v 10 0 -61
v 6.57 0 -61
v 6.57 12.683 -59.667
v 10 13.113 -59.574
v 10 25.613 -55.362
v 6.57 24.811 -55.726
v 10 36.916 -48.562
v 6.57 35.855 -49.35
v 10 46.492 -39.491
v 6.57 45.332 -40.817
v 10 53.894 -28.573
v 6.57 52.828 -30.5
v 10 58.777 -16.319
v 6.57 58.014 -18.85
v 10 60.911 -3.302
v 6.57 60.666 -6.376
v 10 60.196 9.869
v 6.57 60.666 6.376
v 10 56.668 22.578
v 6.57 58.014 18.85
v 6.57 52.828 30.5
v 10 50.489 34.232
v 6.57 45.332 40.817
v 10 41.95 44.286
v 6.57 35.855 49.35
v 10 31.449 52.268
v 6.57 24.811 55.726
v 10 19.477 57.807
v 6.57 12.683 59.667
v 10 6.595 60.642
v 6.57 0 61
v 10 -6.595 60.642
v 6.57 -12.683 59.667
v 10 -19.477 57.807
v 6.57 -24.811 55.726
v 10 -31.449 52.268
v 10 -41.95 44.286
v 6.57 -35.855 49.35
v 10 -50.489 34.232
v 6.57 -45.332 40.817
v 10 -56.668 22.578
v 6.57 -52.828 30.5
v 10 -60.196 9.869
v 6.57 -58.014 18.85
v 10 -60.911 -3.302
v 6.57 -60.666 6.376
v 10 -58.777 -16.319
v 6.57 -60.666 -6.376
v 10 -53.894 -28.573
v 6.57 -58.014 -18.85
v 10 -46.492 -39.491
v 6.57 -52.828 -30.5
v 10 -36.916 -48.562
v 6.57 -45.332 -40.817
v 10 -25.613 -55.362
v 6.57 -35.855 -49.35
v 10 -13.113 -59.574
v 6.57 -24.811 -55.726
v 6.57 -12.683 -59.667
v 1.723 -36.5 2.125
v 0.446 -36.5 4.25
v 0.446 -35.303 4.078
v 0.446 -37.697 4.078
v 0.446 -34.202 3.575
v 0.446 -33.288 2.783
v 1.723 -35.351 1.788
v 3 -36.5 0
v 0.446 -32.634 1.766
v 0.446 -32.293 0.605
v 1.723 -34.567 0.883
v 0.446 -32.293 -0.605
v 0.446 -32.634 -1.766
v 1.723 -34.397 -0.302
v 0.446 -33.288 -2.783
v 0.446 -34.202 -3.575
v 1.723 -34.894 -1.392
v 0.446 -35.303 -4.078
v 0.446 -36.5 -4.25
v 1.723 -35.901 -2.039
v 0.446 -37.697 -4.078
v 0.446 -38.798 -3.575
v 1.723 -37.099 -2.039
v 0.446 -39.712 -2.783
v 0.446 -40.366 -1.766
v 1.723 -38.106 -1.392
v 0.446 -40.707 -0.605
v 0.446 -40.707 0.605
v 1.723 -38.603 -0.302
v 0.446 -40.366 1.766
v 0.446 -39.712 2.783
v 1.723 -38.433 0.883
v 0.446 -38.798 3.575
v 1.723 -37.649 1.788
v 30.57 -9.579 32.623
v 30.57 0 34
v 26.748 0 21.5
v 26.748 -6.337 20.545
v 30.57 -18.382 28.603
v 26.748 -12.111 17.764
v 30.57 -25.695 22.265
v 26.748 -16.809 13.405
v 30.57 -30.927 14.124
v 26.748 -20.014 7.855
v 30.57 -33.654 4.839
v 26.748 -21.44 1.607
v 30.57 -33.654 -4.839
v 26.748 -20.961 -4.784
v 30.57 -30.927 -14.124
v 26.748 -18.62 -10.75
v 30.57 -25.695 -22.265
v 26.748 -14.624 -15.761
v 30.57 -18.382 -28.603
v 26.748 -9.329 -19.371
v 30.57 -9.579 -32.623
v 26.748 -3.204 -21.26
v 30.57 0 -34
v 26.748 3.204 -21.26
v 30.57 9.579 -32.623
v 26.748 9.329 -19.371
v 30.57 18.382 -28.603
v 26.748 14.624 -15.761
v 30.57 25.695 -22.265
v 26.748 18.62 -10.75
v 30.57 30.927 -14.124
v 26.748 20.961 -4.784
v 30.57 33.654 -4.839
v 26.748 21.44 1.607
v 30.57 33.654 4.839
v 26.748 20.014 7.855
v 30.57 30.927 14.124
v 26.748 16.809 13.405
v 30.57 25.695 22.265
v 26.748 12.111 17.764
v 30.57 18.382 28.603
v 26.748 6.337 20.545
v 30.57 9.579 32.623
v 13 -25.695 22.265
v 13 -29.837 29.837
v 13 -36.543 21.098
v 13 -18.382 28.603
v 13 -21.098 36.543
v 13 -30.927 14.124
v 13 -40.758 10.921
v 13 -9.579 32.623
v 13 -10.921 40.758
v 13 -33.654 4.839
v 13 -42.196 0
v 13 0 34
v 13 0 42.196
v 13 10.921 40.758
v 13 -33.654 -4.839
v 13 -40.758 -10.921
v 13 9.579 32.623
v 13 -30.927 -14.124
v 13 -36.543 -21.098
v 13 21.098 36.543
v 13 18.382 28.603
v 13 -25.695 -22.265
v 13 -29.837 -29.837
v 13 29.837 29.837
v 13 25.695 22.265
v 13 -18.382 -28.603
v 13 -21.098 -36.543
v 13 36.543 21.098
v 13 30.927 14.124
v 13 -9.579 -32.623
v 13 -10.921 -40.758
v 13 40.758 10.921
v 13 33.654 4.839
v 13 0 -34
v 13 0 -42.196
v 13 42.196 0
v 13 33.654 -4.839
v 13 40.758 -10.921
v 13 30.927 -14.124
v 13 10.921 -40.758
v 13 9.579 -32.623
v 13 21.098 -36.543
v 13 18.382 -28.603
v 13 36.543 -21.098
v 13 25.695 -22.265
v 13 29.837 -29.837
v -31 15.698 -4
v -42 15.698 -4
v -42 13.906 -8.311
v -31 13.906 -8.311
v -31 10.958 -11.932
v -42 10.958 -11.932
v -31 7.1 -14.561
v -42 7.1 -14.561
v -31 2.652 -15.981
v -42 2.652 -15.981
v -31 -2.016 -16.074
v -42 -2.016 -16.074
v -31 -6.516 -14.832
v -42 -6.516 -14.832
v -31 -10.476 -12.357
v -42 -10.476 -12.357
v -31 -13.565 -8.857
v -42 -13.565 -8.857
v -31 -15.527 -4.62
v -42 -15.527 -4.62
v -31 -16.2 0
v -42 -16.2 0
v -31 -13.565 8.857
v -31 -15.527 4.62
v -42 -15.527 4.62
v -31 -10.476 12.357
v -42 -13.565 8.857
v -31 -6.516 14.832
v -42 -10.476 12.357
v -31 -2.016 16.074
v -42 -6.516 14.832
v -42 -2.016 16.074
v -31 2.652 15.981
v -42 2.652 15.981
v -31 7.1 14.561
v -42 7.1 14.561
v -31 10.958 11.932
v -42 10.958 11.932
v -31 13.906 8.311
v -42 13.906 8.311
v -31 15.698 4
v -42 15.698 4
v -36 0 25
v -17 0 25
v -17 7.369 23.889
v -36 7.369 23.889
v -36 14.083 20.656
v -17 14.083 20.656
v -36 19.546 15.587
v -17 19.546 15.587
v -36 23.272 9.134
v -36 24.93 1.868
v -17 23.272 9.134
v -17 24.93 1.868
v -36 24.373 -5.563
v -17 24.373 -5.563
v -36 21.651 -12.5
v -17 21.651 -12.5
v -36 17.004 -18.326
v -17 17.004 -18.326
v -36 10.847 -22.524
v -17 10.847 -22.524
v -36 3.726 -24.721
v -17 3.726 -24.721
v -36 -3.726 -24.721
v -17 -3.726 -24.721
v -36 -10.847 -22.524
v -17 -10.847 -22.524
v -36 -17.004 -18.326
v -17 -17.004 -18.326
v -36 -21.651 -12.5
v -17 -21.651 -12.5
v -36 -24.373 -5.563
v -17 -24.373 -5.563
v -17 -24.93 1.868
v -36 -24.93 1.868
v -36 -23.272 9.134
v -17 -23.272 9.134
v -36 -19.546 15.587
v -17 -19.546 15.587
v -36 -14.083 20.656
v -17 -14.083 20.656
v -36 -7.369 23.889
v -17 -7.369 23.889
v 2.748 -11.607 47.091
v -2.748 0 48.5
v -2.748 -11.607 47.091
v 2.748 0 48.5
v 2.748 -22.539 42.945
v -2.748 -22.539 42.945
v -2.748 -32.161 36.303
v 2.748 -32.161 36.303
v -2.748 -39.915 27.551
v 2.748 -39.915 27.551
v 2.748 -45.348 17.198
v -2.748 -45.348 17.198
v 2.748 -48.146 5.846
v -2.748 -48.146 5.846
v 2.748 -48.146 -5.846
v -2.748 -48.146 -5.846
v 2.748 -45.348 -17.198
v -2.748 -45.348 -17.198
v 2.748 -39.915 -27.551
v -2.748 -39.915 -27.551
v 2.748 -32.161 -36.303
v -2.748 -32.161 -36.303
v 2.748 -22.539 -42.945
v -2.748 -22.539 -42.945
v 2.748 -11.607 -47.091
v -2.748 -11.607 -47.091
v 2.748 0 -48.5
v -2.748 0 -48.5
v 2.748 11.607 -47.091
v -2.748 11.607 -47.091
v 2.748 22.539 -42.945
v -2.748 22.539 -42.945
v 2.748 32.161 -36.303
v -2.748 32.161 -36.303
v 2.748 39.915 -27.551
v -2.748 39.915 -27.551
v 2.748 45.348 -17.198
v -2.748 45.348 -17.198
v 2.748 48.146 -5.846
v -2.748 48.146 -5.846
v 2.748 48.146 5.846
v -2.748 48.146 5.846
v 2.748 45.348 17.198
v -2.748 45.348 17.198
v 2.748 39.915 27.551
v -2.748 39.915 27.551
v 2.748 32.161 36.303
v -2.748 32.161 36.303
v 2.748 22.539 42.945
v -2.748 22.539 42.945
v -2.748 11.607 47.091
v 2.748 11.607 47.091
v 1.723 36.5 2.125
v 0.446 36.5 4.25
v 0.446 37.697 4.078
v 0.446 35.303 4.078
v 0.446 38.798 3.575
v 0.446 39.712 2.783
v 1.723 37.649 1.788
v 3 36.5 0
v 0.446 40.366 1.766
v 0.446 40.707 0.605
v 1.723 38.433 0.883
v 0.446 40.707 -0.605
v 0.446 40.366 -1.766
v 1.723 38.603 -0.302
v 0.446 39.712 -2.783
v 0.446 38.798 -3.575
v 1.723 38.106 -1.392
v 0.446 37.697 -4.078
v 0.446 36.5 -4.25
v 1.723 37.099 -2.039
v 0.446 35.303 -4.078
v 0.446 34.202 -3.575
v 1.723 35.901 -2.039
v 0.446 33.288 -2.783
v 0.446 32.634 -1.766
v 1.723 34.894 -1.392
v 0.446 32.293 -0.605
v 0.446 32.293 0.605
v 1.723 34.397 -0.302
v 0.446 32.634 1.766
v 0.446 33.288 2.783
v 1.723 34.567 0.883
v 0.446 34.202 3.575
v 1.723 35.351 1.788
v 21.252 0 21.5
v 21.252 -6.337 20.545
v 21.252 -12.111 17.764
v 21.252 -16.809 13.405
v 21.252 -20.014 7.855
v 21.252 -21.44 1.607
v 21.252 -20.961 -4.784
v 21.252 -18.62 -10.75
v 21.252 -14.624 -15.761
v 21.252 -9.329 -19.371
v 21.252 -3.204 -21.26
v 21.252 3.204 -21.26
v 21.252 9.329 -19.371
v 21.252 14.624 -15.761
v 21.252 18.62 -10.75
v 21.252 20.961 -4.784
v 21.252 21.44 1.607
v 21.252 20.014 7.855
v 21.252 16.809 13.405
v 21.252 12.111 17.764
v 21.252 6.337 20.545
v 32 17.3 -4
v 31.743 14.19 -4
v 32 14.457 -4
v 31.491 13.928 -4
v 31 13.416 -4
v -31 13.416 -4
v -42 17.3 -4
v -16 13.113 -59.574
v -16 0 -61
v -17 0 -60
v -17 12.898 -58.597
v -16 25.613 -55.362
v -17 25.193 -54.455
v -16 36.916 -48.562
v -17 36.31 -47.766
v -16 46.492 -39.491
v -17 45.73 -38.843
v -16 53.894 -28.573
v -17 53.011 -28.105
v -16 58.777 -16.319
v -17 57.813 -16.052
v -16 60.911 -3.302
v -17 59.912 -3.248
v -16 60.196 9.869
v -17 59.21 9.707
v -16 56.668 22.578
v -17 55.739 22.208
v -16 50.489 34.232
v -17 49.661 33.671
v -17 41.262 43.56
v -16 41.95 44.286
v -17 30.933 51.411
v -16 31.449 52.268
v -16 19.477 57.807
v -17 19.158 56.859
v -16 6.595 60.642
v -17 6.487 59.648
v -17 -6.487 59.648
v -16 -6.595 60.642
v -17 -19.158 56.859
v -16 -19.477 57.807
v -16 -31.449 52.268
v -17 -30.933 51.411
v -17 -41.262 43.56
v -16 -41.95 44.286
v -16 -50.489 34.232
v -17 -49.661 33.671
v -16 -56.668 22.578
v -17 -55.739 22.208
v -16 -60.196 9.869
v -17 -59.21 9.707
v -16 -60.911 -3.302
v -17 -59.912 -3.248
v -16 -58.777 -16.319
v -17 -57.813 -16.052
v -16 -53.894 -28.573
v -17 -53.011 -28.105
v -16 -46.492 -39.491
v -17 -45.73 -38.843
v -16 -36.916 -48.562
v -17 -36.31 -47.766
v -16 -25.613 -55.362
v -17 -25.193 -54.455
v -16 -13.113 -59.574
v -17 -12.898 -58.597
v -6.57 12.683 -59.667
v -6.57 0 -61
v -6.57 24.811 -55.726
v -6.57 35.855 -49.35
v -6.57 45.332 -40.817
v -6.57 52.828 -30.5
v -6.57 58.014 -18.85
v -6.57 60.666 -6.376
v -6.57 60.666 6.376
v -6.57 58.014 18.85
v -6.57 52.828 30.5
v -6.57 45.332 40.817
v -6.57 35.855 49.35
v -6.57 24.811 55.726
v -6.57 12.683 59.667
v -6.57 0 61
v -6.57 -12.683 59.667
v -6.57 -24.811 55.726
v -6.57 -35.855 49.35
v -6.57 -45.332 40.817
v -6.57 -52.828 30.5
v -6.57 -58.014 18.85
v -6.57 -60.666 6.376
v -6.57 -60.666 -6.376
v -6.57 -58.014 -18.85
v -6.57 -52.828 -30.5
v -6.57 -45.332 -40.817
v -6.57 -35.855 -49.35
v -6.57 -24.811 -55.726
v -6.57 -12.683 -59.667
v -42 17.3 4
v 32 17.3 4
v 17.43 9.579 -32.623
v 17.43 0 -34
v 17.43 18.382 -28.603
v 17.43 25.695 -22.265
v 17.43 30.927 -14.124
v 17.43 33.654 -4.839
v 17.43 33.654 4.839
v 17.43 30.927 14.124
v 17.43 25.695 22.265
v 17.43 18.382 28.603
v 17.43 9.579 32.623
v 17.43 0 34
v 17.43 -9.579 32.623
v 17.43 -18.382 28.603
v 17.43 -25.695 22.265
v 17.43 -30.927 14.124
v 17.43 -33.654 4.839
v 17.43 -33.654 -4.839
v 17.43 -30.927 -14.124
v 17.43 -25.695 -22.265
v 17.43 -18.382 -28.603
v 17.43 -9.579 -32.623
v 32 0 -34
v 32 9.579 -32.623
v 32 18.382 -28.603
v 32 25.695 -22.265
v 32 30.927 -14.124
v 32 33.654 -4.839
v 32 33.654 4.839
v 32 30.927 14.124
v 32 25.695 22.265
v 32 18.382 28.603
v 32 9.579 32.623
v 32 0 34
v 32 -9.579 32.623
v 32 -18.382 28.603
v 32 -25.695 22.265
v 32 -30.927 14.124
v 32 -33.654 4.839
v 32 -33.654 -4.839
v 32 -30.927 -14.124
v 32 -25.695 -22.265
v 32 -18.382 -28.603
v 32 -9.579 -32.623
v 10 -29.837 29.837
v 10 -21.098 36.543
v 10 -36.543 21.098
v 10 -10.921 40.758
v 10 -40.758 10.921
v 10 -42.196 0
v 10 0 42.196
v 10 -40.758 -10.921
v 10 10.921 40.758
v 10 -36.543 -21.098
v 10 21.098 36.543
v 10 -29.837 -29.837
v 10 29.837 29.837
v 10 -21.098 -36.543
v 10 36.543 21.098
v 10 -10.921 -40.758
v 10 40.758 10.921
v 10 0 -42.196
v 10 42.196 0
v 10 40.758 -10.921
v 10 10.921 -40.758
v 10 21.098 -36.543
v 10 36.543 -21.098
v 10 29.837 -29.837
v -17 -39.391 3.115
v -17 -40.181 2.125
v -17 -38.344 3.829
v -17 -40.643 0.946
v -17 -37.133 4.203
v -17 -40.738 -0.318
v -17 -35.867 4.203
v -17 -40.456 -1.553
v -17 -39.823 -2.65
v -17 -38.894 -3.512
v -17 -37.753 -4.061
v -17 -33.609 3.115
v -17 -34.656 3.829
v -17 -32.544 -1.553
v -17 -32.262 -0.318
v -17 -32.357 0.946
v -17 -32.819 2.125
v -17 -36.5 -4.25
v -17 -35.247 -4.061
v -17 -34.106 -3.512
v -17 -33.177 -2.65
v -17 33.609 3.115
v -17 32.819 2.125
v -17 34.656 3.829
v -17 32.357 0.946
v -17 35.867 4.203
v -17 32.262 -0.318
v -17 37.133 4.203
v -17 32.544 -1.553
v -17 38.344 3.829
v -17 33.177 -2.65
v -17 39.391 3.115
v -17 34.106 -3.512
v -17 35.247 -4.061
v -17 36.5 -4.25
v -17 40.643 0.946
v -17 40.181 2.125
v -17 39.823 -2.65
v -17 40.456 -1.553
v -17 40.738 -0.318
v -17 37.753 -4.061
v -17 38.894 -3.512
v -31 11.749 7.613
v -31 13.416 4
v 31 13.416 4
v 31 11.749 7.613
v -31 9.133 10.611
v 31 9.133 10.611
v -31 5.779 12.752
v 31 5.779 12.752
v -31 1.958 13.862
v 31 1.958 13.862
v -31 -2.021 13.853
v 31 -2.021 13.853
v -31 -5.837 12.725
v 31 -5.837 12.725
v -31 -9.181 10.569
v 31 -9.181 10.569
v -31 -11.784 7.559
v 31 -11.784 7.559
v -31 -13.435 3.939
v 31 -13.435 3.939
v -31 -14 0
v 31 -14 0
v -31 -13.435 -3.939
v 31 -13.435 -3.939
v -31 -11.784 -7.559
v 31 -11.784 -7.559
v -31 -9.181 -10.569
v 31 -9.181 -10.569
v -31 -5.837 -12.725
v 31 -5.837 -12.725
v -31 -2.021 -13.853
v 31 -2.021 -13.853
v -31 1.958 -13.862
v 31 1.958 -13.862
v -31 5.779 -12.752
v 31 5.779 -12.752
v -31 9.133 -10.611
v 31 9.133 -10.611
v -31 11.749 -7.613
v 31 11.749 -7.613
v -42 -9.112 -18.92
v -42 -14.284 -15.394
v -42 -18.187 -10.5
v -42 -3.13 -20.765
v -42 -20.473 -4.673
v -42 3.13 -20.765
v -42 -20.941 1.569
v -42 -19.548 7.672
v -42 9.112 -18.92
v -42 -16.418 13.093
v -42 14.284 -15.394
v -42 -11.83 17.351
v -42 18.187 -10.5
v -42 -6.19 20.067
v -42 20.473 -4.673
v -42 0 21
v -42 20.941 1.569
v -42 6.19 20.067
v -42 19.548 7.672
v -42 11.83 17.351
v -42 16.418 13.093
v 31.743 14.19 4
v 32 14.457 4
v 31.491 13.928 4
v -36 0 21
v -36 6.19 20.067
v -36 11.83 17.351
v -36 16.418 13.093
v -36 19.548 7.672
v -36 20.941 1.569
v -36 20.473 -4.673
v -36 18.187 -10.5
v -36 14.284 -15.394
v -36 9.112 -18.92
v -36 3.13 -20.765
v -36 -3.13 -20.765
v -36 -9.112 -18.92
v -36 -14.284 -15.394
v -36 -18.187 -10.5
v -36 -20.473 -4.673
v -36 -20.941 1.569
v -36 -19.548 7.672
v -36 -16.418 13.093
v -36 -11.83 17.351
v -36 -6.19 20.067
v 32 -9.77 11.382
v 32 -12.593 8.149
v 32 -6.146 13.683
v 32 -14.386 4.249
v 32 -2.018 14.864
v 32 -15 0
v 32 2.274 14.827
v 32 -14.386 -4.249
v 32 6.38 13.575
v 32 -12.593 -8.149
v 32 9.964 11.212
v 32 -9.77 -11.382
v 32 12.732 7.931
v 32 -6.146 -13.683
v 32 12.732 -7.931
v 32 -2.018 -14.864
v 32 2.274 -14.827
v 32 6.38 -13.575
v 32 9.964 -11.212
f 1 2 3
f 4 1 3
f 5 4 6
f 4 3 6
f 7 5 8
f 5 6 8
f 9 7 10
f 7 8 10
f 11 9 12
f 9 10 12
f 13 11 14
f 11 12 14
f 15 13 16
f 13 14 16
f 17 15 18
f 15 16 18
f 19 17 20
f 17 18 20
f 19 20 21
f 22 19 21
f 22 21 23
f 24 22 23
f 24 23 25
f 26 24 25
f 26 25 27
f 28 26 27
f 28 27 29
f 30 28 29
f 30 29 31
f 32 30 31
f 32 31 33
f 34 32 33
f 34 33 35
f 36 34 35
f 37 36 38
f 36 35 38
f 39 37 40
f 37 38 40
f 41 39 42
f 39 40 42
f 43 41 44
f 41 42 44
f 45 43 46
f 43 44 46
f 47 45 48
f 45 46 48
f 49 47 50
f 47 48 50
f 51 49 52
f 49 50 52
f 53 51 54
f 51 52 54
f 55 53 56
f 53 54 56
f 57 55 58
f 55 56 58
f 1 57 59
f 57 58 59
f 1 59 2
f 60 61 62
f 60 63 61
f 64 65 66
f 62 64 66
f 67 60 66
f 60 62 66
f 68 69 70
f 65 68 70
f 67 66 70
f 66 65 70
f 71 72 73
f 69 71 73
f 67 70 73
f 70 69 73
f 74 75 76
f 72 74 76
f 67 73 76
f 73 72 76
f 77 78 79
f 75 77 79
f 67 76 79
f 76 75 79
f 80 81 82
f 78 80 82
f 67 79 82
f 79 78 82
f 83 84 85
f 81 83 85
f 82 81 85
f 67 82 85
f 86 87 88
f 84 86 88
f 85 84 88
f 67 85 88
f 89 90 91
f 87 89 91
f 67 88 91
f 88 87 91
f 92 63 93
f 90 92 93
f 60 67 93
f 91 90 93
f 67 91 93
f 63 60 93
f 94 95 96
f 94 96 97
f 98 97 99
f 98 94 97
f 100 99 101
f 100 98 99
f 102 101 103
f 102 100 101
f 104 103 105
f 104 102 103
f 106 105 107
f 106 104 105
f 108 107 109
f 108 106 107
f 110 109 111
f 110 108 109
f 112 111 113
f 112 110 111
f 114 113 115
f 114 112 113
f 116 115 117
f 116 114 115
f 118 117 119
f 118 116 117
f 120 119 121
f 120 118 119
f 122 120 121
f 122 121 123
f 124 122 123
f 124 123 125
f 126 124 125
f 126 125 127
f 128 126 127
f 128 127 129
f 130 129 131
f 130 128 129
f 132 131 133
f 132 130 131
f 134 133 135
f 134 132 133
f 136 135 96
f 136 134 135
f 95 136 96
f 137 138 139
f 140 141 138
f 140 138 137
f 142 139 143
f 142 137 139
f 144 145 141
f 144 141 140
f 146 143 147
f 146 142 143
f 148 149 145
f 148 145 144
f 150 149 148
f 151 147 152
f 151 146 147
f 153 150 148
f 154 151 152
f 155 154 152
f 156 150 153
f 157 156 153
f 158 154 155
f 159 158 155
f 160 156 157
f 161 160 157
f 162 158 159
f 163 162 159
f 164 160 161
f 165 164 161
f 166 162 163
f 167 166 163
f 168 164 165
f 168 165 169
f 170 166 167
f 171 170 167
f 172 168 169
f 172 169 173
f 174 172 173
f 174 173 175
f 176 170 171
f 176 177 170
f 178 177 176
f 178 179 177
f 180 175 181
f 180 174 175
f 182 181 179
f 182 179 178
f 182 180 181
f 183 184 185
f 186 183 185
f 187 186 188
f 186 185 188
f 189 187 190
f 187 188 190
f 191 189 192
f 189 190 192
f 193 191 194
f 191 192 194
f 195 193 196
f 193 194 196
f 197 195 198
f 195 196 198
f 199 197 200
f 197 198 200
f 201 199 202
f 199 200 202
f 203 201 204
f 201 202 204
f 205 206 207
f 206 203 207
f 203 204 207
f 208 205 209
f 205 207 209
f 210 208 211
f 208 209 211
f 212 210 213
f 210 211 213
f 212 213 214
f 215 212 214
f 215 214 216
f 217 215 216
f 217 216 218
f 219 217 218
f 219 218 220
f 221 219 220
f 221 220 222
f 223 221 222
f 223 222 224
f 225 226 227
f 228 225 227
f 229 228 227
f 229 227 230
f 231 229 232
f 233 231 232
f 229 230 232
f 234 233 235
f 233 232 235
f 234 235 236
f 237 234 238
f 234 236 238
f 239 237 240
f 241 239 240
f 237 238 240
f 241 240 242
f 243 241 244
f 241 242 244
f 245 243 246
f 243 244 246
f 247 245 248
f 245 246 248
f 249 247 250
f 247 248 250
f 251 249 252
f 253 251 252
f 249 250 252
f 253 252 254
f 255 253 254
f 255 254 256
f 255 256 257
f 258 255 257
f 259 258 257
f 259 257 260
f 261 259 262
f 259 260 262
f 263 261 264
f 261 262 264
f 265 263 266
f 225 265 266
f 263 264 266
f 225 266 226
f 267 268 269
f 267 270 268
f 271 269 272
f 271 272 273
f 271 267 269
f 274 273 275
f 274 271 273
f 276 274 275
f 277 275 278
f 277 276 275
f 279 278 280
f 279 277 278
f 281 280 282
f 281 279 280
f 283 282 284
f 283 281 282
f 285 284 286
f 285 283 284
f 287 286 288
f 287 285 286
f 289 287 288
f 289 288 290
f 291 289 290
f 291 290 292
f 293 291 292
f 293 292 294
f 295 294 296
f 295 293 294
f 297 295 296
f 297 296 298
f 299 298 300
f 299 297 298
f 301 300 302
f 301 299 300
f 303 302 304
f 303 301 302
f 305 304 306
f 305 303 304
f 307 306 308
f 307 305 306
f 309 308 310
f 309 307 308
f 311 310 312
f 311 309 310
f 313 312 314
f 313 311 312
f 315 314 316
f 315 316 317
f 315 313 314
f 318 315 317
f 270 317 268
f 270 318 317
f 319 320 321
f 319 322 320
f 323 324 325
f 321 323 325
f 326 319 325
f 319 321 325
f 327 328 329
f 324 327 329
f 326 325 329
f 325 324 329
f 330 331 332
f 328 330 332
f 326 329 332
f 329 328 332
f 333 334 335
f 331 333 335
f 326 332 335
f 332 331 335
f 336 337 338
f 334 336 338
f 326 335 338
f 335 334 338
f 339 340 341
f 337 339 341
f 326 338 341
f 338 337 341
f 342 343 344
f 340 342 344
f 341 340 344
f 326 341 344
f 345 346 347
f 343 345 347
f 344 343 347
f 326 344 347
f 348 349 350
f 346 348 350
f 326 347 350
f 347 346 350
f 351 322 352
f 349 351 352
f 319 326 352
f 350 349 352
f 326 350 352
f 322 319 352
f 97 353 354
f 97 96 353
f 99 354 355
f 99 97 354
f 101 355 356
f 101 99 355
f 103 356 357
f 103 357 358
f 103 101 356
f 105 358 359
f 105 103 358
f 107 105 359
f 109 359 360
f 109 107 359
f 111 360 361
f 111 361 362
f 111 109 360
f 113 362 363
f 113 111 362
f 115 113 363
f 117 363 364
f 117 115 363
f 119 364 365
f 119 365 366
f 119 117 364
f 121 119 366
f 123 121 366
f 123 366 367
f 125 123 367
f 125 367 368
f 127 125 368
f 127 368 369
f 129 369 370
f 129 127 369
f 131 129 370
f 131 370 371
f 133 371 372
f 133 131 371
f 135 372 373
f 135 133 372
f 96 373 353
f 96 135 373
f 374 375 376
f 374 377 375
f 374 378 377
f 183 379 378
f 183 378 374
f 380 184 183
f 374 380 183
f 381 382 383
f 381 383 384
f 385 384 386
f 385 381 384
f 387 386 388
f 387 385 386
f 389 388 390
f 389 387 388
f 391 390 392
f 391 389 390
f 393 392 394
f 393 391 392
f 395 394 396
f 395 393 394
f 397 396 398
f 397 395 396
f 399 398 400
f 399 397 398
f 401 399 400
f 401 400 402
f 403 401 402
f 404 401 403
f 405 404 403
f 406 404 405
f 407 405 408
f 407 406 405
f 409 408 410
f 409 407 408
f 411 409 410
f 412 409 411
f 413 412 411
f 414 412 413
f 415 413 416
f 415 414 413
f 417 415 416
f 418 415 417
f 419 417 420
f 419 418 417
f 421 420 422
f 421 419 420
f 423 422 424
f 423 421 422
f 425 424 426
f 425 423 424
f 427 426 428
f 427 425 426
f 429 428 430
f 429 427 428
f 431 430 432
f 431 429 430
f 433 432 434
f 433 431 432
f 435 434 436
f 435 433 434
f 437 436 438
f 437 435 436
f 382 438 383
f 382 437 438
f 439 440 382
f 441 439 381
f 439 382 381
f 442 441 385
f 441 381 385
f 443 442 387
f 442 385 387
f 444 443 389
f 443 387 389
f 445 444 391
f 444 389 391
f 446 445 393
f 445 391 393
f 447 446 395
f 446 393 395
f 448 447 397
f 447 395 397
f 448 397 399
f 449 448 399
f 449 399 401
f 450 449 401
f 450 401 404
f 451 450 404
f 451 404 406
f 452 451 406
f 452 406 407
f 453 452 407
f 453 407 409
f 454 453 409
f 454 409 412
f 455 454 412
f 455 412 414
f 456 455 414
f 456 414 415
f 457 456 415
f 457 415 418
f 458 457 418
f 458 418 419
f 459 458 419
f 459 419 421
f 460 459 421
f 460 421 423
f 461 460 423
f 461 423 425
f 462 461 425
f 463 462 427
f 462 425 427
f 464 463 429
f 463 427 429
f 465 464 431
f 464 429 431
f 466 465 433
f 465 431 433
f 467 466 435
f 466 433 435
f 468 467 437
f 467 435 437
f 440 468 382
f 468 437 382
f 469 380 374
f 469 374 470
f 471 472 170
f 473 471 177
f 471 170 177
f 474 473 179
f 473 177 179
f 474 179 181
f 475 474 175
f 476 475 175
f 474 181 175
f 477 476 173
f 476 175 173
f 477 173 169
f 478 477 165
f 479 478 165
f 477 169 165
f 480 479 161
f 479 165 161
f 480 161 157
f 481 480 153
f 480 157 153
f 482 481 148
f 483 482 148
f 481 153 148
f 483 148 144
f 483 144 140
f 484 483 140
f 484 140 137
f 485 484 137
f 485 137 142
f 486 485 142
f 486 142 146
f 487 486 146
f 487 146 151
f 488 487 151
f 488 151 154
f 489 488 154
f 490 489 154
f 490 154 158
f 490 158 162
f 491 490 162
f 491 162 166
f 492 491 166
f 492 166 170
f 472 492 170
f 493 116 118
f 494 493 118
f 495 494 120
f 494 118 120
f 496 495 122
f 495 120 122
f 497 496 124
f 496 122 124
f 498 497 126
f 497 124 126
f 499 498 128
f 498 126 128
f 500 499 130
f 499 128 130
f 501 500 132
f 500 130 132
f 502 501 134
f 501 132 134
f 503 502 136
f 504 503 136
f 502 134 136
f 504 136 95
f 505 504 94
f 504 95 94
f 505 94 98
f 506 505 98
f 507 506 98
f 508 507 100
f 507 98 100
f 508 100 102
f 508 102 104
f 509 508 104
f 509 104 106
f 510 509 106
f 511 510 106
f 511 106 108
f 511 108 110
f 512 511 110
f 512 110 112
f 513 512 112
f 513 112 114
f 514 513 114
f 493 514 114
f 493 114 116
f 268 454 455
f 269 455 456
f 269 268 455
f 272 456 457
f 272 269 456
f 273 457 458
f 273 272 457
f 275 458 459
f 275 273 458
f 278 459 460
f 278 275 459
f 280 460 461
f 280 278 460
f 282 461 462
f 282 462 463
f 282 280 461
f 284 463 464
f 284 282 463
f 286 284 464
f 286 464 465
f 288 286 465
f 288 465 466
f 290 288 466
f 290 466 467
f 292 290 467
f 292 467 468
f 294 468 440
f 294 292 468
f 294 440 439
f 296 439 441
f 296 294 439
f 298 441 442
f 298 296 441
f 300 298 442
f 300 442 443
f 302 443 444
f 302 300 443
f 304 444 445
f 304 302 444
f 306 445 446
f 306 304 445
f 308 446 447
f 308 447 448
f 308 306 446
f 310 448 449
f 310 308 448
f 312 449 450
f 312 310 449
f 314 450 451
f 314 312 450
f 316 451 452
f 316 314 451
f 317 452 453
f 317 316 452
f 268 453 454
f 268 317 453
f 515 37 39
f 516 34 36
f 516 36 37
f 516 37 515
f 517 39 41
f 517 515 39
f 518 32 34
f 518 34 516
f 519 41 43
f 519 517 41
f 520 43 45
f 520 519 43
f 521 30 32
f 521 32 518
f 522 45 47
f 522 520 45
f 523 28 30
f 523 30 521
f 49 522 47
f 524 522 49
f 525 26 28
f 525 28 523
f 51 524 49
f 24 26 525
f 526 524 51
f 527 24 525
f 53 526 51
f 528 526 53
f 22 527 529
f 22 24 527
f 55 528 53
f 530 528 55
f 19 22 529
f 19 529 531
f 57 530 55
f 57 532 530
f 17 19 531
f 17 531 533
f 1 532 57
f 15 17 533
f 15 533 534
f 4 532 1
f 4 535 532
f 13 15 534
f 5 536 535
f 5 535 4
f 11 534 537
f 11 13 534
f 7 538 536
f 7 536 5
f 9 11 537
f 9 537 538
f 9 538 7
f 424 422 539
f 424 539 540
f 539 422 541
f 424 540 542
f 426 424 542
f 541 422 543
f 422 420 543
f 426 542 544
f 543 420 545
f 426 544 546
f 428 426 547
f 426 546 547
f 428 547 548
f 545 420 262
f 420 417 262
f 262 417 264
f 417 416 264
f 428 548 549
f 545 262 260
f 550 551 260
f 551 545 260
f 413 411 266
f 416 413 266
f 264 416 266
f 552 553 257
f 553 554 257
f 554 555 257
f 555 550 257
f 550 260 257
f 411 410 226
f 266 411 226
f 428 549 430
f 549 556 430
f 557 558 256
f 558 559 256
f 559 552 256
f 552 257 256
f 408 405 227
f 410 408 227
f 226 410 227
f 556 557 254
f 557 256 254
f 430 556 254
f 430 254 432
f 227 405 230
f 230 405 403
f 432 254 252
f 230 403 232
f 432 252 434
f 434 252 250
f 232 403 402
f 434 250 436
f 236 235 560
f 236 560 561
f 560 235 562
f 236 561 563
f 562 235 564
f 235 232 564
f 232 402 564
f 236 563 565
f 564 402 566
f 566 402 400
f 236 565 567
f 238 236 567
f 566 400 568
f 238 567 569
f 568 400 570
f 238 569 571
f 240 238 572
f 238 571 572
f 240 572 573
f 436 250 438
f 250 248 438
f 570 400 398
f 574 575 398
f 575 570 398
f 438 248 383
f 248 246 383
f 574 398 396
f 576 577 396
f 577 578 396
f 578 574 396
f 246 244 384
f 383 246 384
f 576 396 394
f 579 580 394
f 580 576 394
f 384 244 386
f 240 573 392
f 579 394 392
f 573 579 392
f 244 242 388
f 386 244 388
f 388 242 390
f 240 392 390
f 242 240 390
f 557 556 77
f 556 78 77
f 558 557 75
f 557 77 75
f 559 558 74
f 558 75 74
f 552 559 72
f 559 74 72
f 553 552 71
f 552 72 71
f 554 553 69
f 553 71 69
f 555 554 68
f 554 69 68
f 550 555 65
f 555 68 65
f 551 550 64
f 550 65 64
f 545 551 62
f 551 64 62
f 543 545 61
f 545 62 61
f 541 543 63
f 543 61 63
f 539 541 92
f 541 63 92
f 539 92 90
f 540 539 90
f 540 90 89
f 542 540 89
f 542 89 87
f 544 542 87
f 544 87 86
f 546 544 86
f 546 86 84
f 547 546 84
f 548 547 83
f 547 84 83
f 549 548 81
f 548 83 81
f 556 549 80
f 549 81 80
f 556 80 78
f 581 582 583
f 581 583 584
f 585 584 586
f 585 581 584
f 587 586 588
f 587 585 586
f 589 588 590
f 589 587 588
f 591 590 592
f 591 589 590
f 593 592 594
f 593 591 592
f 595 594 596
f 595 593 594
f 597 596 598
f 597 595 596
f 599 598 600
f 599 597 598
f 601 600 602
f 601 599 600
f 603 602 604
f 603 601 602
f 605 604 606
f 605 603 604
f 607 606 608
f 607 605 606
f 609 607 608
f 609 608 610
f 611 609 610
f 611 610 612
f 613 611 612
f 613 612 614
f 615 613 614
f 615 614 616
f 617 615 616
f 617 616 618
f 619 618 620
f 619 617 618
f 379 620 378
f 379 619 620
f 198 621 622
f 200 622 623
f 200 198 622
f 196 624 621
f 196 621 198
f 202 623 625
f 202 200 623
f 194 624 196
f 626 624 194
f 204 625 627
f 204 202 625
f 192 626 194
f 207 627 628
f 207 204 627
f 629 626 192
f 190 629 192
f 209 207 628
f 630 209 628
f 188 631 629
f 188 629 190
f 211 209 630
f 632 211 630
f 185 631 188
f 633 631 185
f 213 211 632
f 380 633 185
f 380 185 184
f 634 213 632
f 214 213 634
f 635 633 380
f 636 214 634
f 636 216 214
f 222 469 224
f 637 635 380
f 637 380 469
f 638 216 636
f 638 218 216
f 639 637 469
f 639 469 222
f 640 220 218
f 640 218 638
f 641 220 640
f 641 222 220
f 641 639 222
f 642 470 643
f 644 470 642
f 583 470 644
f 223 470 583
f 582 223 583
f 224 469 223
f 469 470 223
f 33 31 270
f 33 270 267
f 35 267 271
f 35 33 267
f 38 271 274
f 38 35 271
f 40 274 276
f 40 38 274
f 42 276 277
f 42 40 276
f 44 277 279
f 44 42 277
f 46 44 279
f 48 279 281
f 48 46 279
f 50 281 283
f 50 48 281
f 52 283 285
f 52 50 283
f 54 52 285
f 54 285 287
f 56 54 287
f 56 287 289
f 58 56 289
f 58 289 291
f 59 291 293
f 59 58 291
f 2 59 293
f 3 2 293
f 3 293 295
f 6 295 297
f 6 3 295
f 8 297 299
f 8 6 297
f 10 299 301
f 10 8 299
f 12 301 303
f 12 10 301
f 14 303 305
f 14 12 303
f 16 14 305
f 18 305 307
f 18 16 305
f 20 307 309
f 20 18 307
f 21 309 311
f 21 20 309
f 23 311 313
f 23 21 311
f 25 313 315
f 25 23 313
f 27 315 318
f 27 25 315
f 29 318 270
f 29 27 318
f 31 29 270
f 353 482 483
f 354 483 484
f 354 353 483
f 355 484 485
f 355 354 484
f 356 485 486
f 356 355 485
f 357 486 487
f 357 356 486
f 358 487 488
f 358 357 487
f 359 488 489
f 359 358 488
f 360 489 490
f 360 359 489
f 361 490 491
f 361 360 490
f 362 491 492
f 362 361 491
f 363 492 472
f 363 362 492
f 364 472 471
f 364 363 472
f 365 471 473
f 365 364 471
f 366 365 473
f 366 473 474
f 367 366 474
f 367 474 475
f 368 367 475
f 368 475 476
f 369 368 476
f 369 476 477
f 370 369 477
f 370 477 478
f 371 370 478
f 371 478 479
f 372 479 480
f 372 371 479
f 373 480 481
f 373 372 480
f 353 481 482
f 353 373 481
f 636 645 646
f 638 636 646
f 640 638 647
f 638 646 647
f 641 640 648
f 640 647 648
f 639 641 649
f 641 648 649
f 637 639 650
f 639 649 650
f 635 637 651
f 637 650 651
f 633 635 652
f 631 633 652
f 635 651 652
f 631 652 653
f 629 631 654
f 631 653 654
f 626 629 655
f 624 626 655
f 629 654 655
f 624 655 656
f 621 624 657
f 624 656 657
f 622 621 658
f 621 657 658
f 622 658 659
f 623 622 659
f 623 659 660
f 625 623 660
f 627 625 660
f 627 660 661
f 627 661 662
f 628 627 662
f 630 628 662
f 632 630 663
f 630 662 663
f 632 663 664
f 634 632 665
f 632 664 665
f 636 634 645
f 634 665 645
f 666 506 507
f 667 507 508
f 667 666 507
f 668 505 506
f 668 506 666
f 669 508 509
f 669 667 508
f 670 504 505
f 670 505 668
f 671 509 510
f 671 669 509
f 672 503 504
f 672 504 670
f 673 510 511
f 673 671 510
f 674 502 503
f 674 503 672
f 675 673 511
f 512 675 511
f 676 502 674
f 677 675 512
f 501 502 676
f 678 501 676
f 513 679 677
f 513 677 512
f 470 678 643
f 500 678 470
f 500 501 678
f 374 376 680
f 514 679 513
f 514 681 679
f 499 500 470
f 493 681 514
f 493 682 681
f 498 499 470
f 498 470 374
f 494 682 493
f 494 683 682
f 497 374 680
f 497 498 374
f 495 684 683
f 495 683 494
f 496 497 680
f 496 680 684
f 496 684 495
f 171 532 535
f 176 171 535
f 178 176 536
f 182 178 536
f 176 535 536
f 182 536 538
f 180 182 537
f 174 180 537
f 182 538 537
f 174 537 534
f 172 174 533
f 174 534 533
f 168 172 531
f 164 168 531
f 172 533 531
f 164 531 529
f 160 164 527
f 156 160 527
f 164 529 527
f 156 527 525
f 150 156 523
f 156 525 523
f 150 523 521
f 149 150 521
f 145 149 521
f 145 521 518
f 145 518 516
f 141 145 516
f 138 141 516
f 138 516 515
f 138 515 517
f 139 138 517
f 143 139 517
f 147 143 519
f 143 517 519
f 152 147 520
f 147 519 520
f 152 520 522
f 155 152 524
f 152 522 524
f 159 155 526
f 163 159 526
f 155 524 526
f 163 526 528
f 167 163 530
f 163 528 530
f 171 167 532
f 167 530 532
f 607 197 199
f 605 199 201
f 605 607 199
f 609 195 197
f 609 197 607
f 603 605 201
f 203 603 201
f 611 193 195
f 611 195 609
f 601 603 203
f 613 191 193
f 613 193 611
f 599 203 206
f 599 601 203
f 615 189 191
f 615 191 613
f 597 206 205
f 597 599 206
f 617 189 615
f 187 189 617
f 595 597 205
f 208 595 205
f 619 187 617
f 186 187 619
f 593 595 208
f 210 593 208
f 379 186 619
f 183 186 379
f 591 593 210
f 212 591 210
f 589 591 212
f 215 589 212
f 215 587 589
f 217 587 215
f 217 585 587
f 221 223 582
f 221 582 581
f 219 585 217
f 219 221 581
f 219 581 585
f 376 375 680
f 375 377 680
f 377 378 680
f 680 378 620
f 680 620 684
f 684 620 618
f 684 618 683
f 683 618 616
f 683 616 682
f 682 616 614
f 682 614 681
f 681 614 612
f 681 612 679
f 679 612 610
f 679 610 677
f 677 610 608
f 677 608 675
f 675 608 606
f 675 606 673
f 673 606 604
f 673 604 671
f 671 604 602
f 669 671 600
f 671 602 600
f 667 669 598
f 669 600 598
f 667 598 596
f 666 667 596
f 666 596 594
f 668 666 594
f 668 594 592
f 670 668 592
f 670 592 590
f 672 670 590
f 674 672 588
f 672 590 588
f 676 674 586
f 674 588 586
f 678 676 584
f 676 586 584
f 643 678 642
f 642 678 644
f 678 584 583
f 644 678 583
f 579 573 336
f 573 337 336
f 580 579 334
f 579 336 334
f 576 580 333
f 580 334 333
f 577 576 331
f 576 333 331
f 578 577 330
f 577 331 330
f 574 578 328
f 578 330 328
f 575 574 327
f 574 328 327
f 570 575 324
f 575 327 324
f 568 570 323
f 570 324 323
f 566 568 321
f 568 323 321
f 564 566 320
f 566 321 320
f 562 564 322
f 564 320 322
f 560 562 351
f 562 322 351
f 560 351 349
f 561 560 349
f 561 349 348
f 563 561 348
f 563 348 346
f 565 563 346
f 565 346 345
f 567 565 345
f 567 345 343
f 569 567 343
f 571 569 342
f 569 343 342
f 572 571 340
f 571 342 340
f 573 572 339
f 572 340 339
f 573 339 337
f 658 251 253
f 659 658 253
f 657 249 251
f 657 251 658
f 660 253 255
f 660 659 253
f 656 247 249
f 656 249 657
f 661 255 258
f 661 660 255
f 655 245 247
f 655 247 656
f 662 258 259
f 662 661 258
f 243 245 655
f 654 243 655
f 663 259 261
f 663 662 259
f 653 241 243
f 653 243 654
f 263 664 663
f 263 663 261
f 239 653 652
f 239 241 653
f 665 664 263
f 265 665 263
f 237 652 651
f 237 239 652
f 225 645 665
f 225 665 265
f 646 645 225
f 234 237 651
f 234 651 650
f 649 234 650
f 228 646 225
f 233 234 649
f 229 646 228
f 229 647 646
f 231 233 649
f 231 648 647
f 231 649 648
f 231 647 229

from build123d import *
from build123d.topology import SkipClean

# Parameters (mm, degrees)
EXTRUDE_1_DEPTH         = 10
EXTRUDE_1_DEPTH_BACK    = 17
SKETCH_1_R              = 61
SKETCH_3_R              = 25
EXTRUDE_2_DEPTH         = 19
SKETCH_4_R              = 21
EXTRUDE_3_DEPTH         = 6
SKETCH_5_R              = 16.2
CUT_EXTRUDE_1_DEPTH     = 11
SKETCH_6_R              = 14
CUT_EXTRUDE_2_DEPTH     = 96.514396821
HOLE_WIZARD_M10_1_D     = 8.5
HOLE_WIZARD_M10_1_DEPTH = 17.446342369
HOLE_WIZARD_M10_1_TIP   = 2.553657631
SKETCH_10_R             = 42.19592905
UNDEF_DEPTH             = 3
SKETCH_11_R             = 34
EXTRUDE_5_DEPTH         = 19
CUT_EXTRUDE_3_DEPTH     = 114.657379875
CHAMFER_1_SIZE          = 1


with BuildPart() as part:
    # 草图1 → 凸台-拉伸1 (new, two sides: drawn at the far end of the back side and taken through both)
    with BuildSketch(Plane(origin=(0, 0, 0), x_dir=(0, 0, -1), z_dir=(1, 0, 0)).offset(-EXTRUDE_1_DEPTH_BACK)):
        Circle(SKETCH_1_R)
    extrude(amount=EXTRUDE_1_DEPTH + EXTRUDE_1_DEPTH_BACK)

    # 草图2 → 切除-旋转1 (revolve, cut)
    with BuildSketch(Plane(origin=(0, 0, 0), x_dir=(1, 0, 0), z_dir=(0, 1, 0))):
        Polygon((-6.570057385, 61), (-2.748423867, 48.5), (2.748423867, 48.5), (6.570057385, 61), align=None)
    revolve(axis=Axis((0, 0, 0), (1, 0, 0)), mode=Mode.SUBTRACT)

    # 草图3 → 凸台-拉伸2 (add)
    with BuildSketch(Plane.ZY.offset(17)):
        Circle(SKETCH_3_R)
    extrude(amount=EXTRUDE_2_DEPTH)

    # 草图4 → 凸台-拉伸3 (add)
    with BuildSketch(Plane.ZY.offset(36)):
        Circle(SKETCH_4_R)
    extrude(amount=EXTRUDE_3_DEPTH)

    # 草图5 → 切除-拉伸1 (cut)
    with BuildSketch(Plane.ZY.offset(42)):
        Circle(SKETCH_5_R)
    extrude(amount=-CUT_EXTRUDE_1_DEPTH, mode=Mode.SUBTRACT)

    # 草图6 → 切除-拉伸2 (cut, through all)
    with BuildSketch(Plane.ZY.offset(31)):
        Circle(SKETCH_6_R)
    extrude(amount=-CUT_EXTRUDE_2_DEPTH, mode=Mode.SUBTRACT)

    # M10 螺纹孔1
    with Locations(Plane.ZY.offset(17)):
        with Locations((0, -36.5), (0, 36.5)):
            Hole(HOLE_WIZARD_M10_1_D / 2, depth=HOLE_WIZARD_M10_1_DEPTH)
            with Locations((0, 0, -(HOLE_WIZARD_M10_1_DEPTH + HOLE_WIZARD_M10_1_TIP / 2))):  # 118° drill point
                Cone(0, HOLE_WIZARD_M10_1_D / 2, HOLE_WIZARD_M10_1_TIP, mode=Mode.SUBTRACT)

    # 草图10 → undef (add)
    with BuildSketch(Plane(origin=(10, 0, 0), x_dir=(0, 0, -1), z_dir=(1, 0, 0))):
        Circle(SKETCH_10_R)
    extrude(amount=UNDEF_DEPTH)

    # 草图11 → 凸台-拉伸5 (add)
    with BuildSketch(Plane(origin=(13, 0, 0), x_dir=(0, 0, -1), z_dir=(1, 0, 0))):
        Circle(SKETCH_11_R)
    extrude(amount=EXTRUDE_5_DEPTH)

    # 草图12 → 切除-旋转2 (revolve, cut)
    with BuildSketch(Plane.XY):
        Polygon((21.251576133, 21.5), (26.748423867, 21.5), (30.570057385, 34), (17.429942615, 34), align=None)
    revolve(axis=Axis((0, 0, 0), (1, 0, 0)), mode=Mode.SUBTRACT)

    # 草图7 → 切除-拉伸3 (cut, through all)
    with SkipClean():  # the faces are left unmerged after this step: merging them gives an invalid solid
        with BuildSketch(Plane.ZY.offset(42)):
            with BuildLine():
                Line((-4, 17.3), (4, 17.3))
                Line((4, 17.3), (4, 13.416407865))
                ThreePointArc((4, 13.416407865), (0, -14), (-4, 13.416407865))
                Line((-4, 13.416407865), (-4, 17.3))
            make_face()
        extrude(amount=-CUT_EXTRUDE_3_DEPTH, mode=Mode.SUBTRACT)
    add(part.part.scale(1), mode=Mode.REPLACE)  # the faces are merged on a copy

    # 倒角1
    chamfer_1_edges = [part.edges().sort_by_distance(p)[0] for p in [
        (32, -14, 0),
        (-17, 0, 61),
    ]]
    chamfer(chamfer_1_edges, length=CHAMFER_1_SIZE)


solid = part.part
